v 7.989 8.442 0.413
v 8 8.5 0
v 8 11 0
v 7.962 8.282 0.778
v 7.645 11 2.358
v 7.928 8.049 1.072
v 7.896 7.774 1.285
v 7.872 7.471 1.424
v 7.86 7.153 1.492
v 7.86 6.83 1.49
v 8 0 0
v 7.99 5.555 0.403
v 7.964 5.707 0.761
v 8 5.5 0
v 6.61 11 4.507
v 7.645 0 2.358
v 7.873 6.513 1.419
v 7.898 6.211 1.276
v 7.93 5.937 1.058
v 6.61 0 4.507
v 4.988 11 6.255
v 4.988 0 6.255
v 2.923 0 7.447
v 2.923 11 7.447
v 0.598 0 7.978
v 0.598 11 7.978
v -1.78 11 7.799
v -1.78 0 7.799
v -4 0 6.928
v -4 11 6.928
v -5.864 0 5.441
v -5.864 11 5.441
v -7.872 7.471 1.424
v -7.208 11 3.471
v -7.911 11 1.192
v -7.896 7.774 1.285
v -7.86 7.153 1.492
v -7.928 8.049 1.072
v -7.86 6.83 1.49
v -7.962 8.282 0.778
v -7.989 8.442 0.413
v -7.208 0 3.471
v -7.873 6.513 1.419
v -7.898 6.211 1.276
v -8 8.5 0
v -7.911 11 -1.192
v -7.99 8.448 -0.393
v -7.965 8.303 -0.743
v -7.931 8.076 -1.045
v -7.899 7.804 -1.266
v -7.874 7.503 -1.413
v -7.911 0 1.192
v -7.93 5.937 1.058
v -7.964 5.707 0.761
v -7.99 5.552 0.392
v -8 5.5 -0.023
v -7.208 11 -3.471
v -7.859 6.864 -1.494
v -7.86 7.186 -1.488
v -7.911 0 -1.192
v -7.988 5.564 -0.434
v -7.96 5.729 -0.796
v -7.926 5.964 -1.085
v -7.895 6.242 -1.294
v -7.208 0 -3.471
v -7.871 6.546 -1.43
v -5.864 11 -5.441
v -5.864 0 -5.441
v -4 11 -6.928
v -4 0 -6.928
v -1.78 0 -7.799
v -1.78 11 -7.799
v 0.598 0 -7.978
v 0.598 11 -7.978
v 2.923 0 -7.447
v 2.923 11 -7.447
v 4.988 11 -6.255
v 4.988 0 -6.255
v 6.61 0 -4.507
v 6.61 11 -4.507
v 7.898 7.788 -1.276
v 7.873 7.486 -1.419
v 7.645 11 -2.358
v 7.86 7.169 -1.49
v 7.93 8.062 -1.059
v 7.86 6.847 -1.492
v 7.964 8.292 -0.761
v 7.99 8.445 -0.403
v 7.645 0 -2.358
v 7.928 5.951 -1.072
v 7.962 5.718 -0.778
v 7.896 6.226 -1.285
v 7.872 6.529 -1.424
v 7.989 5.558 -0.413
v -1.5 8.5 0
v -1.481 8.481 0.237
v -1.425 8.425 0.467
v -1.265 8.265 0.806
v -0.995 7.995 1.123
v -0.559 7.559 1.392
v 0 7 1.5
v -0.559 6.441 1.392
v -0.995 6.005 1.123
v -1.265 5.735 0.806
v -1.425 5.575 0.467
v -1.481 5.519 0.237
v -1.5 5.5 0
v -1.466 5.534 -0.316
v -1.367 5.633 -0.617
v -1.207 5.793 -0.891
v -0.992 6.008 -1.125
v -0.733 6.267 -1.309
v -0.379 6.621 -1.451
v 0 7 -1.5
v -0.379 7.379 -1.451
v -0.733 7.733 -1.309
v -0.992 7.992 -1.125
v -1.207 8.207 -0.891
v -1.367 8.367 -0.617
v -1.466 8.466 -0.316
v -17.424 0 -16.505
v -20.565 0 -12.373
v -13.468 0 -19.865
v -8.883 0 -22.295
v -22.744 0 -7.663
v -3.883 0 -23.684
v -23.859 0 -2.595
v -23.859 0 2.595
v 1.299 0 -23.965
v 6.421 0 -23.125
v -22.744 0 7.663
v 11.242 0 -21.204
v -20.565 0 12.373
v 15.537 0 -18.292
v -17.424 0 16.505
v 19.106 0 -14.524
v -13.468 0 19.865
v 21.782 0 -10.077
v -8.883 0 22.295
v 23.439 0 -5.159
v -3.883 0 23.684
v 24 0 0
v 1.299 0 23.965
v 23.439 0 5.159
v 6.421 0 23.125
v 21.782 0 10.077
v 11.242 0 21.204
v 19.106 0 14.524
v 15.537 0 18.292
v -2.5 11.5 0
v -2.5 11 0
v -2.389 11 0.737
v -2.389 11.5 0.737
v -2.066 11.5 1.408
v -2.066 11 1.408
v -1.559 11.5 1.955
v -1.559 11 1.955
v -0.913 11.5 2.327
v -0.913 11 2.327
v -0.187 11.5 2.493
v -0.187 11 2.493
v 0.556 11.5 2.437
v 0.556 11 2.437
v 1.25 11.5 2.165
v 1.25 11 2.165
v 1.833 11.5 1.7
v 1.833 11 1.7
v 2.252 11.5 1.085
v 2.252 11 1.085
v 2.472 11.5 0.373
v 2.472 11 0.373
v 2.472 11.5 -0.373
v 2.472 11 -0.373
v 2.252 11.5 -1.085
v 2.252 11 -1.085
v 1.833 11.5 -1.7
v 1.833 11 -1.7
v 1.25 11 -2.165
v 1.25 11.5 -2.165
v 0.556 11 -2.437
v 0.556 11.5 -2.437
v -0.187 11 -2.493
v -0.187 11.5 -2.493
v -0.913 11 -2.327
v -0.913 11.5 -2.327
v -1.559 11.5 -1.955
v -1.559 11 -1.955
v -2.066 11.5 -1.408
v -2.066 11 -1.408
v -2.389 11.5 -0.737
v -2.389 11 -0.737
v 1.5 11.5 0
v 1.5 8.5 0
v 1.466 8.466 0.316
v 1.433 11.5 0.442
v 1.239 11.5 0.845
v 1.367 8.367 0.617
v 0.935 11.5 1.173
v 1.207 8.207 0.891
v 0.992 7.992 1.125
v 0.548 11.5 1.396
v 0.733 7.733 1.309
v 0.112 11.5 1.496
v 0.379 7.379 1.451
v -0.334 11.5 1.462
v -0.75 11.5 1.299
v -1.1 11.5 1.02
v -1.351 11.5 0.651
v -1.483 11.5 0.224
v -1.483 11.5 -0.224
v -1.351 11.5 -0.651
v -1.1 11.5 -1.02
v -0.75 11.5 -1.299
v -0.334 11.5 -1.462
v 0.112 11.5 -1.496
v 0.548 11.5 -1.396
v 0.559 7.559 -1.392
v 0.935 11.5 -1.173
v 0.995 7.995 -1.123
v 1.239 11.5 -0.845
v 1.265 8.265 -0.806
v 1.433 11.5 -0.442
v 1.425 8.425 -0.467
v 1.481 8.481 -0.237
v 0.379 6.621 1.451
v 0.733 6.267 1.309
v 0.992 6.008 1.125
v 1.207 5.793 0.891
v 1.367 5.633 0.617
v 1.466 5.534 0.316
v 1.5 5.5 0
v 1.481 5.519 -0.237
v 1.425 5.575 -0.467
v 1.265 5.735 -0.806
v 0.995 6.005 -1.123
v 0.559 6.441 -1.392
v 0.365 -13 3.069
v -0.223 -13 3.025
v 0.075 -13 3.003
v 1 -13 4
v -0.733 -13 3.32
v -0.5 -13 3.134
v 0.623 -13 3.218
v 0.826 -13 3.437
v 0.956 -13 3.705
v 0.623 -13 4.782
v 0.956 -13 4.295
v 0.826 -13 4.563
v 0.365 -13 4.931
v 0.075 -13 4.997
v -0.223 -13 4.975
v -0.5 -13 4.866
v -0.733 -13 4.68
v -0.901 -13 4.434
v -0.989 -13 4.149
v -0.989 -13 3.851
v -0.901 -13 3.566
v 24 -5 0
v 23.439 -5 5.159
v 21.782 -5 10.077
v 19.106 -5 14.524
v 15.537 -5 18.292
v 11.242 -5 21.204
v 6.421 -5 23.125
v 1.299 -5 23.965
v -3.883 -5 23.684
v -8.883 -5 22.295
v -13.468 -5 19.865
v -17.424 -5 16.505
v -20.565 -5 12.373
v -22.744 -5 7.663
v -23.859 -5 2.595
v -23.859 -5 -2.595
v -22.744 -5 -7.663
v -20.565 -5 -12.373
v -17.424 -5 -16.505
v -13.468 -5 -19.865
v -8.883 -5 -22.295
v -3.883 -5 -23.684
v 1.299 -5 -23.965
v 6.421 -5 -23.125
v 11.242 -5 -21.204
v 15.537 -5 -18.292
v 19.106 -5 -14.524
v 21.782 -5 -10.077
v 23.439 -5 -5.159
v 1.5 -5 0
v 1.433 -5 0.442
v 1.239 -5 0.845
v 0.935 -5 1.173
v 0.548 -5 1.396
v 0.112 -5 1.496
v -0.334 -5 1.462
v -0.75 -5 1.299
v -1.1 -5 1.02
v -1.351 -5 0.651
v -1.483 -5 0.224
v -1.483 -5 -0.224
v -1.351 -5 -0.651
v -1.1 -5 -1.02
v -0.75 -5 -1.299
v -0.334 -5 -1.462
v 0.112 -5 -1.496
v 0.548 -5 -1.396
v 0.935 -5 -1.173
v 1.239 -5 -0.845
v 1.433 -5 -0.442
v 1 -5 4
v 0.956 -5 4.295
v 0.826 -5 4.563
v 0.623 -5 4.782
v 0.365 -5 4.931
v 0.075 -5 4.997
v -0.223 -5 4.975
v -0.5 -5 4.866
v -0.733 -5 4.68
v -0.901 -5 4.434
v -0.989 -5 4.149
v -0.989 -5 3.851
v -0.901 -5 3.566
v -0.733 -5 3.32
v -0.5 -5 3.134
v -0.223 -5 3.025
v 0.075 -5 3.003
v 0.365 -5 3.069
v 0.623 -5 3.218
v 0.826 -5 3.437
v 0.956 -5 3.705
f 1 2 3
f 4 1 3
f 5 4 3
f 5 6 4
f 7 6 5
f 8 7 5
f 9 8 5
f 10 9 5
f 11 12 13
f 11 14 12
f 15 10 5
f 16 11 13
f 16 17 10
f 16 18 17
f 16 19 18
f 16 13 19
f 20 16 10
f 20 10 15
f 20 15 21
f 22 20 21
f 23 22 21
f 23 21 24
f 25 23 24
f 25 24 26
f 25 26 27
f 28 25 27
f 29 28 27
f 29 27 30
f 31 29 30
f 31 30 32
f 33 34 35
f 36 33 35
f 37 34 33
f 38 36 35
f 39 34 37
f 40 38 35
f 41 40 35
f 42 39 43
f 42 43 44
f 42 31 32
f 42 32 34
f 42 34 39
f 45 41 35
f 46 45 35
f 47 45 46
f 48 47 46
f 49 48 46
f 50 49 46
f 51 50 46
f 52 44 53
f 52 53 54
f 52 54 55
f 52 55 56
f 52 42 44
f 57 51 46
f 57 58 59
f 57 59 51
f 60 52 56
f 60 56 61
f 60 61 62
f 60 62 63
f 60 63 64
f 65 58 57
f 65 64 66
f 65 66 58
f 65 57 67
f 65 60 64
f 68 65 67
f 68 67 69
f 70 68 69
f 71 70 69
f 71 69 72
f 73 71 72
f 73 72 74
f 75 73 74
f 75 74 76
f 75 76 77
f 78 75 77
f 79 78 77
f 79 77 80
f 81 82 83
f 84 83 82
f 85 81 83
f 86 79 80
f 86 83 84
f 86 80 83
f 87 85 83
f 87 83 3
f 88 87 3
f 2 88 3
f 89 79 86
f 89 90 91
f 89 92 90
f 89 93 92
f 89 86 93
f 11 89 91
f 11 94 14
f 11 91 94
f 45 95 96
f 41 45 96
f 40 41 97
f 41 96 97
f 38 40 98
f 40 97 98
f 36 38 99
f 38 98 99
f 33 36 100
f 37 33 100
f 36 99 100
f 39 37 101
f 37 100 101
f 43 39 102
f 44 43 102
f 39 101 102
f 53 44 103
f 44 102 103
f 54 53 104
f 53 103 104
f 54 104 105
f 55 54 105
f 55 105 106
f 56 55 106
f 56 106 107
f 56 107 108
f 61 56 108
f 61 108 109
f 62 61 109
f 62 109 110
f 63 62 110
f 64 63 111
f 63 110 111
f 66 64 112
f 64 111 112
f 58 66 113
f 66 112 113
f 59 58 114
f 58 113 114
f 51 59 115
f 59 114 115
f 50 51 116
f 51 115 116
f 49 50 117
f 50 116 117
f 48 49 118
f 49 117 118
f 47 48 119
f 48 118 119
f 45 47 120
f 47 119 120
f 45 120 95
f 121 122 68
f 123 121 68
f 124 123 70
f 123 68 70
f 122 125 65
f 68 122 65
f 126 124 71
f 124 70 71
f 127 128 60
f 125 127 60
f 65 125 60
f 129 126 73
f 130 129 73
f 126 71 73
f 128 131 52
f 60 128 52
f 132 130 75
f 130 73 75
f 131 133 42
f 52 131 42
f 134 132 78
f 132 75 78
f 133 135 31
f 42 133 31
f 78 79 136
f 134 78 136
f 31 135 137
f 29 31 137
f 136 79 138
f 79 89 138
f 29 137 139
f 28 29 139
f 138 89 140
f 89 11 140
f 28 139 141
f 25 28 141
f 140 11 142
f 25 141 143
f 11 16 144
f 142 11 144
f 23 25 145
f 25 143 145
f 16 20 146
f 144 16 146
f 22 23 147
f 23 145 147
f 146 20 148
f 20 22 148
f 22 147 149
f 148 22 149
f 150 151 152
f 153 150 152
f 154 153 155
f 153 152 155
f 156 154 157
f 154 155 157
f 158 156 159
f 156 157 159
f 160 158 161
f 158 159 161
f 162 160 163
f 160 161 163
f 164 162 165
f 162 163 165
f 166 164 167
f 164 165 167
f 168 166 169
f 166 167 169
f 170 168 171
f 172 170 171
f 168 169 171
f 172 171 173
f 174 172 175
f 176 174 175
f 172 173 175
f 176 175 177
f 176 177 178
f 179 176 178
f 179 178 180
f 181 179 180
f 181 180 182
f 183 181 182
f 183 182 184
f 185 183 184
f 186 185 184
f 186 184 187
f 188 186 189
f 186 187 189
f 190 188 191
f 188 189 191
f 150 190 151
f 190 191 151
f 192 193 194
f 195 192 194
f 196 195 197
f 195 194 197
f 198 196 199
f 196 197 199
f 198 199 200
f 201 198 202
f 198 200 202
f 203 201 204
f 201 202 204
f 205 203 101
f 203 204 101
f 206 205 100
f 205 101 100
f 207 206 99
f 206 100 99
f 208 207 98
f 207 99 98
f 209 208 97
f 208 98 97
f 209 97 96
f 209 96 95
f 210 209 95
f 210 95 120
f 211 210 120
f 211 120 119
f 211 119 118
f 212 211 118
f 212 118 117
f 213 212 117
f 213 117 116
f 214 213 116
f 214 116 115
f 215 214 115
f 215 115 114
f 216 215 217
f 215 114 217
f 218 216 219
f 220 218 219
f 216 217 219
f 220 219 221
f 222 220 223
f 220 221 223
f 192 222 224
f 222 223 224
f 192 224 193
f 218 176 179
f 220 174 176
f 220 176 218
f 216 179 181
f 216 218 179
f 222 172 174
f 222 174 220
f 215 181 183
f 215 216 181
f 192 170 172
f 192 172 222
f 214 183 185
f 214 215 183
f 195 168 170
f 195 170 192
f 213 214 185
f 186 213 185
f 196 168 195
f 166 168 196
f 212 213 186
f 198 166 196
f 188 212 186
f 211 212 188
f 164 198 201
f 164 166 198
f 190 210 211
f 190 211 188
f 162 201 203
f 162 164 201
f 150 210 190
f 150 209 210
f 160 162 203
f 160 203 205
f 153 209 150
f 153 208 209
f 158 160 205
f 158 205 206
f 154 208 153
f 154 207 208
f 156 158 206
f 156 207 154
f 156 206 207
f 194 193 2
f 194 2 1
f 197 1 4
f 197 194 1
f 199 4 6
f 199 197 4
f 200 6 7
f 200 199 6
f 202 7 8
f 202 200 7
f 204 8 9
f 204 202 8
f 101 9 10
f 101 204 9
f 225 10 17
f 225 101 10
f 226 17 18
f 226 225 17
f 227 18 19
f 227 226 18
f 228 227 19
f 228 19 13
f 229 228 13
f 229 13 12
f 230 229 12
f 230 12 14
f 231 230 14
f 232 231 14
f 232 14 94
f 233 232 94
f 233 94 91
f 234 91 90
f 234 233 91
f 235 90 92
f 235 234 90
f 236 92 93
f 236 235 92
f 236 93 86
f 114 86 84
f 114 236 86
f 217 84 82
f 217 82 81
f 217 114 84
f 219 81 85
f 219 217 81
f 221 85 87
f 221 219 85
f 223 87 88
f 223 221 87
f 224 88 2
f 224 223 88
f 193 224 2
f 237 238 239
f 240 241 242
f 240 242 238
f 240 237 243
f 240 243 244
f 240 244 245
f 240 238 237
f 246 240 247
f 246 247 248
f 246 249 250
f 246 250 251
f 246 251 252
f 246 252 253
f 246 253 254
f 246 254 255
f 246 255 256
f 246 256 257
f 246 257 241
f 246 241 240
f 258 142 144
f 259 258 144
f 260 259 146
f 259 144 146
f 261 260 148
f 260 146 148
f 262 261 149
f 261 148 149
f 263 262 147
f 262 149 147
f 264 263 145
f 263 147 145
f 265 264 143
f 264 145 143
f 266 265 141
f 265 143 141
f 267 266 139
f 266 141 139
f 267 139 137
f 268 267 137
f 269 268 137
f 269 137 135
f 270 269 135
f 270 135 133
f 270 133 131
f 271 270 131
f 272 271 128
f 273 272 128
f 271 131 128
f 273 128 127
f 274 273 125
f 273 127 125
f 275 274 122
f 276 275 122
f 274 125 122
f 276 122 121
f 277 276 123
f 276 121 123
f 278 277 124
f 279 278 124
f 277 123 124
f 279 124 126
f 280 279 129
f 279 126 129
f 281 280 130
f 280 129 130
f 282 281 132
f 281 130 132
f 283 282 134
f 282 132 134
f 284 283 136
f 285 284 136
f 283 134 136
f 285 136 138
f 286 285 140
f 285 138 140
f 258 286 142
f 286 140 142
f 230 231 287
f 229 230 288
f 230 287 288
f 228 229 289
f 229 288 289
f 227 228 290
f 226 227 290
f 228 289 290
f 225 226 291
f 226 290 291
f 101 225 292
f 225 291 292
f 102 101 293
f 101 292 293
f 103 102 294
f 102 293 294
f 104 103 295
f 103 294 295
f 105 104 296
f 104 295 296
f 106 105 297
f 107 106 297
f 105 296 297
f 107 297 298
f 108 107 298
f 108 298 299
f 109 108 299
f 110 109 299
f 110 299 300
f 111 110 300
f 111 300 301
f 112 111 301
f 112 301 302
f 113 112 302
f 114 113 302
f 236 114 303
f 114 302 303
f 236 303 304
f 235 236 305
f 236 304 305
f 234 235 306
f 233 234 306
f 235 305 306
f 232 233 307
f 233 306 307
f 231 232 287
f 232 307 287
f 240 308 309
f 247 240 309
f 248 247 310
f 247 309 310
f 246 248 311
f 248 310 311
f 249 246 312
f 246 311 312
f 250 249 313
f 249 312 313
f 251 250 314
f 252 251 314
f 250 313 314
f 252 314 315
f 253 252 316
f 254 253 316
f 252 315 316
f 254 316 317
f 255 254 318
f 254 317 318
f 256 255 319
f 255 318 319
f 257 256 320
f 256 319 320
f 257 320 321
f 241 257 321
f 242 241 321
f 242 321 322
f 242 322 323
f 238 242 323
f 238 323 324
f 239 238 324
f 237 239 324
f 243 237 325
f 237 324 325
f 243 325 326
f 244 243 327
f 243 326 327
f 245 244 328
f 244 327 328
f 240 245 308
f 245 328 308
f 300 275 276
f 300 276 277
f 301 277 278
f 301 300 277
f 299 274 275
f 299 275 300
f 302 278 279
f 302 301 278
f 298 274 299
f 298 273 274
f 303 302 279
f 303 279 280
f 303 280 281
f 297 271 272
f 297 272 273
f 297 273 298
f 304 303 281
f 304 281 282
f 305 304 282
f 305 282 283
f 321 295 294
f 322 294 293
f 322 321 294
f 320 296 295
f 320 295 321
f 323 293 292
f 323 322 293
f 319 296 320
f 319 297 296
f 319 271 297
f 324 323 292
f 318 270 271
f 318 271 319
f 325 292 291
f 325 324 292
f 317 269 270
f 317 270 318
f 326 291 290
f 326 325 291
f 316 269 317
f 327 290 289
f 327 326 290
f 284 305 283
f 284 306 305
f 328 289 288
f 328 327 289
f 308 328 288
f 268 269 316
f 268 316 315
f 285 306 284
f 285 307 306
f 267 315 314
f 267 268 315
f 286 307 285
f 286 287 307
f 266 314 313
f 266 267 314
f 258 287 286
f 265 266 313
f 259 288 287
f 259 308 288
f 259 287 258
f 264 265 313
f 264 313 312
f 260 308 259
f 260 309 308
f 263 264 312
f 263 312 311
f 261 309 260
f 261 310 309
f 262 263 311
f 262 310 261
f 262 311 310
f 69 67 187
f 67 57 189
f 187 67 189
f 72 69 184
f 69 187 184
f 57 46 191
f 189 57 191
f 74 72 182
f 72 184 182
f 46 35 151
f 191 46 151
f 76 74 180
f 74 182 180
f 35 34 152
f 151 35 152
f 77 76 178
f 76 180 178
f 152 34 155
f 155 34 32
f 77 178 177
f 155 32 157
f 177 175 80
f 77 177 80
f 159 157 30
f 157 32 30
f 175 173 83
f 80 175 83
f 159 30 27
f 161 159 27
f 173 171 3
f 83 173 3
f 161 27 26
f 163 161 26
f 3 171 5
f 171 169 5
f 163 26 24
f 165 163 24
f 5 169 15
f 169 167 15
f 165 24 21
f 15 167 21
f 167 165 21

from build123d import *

# Parameters (mm, degrees)
F0_R          = 24
F0_R_2        = 8
F1_DEPTH      = 5
F2_DEPTH      = 11
F3_R          = 2.5
F4_DEPTH      = 0.5
F5_R          = 1.5
F6_DEPTH      = 25
F5_R_2        = 1
F7_DEPTH      = 8
F8_R          = 1.5
F9_DEPTH      = 24.001
F9_DEPTH_BACK = 24.001


with BuildPart() as f1:
    # F0 (on Front) → F1 (new body)
    with BuildSketch(Plane.XZ):
        Circle(F0_R)
        Circle(F0_R_2, mode=Mode.SUBTRACT)
        Circle(F0_R_2)
    extrude(amount=F1_DEPTH)

    # F0 (on Front) → F2 (join)
    with BuildSketch(Plane.XZ):
        Circle(F0_R_2)
    extrude(amount=-F2_DEPTH)

    # F3 (on face) → F4 (join)
    with BuildSketch(Plane(origin=(0, 11, 0), x_dir=(-1, 0, 0), z_dir=(0, 1, 0))):
        Circle(F3_R)
    extrude(amount=F4_DEPTH)

    # F5 (on face) → F6 (cut)
    with BuildSketch(Plane.XZ.offset(5)):
        Circle(F5_R)
    extrude(amount=-F6_DEPTH, mode=Mode.SUBTRACT)

    # F5 (on face) → F7 (join)
    with BuildSketch(Plane.XZ.offset(5)):
        with Locations((0, 4)):
            Circle(F5_R_2)
    extrude(amount=F7_DEPTH)

    # F8 (on Right) → F9 (cut, two sides)
    with BuildSketch(Plane.YZ) as f9_sk:
        with Locations((7, 0)):
            Circle(F8_R)
    extrude(amount=-F9_DEPTH, mode=Mode.SUBTRACT)
    extrude(f9_sk.sketch, amount=F9_DEPTH_BACK, mode=Mode.SUBTRACT)


solid = f1.part
